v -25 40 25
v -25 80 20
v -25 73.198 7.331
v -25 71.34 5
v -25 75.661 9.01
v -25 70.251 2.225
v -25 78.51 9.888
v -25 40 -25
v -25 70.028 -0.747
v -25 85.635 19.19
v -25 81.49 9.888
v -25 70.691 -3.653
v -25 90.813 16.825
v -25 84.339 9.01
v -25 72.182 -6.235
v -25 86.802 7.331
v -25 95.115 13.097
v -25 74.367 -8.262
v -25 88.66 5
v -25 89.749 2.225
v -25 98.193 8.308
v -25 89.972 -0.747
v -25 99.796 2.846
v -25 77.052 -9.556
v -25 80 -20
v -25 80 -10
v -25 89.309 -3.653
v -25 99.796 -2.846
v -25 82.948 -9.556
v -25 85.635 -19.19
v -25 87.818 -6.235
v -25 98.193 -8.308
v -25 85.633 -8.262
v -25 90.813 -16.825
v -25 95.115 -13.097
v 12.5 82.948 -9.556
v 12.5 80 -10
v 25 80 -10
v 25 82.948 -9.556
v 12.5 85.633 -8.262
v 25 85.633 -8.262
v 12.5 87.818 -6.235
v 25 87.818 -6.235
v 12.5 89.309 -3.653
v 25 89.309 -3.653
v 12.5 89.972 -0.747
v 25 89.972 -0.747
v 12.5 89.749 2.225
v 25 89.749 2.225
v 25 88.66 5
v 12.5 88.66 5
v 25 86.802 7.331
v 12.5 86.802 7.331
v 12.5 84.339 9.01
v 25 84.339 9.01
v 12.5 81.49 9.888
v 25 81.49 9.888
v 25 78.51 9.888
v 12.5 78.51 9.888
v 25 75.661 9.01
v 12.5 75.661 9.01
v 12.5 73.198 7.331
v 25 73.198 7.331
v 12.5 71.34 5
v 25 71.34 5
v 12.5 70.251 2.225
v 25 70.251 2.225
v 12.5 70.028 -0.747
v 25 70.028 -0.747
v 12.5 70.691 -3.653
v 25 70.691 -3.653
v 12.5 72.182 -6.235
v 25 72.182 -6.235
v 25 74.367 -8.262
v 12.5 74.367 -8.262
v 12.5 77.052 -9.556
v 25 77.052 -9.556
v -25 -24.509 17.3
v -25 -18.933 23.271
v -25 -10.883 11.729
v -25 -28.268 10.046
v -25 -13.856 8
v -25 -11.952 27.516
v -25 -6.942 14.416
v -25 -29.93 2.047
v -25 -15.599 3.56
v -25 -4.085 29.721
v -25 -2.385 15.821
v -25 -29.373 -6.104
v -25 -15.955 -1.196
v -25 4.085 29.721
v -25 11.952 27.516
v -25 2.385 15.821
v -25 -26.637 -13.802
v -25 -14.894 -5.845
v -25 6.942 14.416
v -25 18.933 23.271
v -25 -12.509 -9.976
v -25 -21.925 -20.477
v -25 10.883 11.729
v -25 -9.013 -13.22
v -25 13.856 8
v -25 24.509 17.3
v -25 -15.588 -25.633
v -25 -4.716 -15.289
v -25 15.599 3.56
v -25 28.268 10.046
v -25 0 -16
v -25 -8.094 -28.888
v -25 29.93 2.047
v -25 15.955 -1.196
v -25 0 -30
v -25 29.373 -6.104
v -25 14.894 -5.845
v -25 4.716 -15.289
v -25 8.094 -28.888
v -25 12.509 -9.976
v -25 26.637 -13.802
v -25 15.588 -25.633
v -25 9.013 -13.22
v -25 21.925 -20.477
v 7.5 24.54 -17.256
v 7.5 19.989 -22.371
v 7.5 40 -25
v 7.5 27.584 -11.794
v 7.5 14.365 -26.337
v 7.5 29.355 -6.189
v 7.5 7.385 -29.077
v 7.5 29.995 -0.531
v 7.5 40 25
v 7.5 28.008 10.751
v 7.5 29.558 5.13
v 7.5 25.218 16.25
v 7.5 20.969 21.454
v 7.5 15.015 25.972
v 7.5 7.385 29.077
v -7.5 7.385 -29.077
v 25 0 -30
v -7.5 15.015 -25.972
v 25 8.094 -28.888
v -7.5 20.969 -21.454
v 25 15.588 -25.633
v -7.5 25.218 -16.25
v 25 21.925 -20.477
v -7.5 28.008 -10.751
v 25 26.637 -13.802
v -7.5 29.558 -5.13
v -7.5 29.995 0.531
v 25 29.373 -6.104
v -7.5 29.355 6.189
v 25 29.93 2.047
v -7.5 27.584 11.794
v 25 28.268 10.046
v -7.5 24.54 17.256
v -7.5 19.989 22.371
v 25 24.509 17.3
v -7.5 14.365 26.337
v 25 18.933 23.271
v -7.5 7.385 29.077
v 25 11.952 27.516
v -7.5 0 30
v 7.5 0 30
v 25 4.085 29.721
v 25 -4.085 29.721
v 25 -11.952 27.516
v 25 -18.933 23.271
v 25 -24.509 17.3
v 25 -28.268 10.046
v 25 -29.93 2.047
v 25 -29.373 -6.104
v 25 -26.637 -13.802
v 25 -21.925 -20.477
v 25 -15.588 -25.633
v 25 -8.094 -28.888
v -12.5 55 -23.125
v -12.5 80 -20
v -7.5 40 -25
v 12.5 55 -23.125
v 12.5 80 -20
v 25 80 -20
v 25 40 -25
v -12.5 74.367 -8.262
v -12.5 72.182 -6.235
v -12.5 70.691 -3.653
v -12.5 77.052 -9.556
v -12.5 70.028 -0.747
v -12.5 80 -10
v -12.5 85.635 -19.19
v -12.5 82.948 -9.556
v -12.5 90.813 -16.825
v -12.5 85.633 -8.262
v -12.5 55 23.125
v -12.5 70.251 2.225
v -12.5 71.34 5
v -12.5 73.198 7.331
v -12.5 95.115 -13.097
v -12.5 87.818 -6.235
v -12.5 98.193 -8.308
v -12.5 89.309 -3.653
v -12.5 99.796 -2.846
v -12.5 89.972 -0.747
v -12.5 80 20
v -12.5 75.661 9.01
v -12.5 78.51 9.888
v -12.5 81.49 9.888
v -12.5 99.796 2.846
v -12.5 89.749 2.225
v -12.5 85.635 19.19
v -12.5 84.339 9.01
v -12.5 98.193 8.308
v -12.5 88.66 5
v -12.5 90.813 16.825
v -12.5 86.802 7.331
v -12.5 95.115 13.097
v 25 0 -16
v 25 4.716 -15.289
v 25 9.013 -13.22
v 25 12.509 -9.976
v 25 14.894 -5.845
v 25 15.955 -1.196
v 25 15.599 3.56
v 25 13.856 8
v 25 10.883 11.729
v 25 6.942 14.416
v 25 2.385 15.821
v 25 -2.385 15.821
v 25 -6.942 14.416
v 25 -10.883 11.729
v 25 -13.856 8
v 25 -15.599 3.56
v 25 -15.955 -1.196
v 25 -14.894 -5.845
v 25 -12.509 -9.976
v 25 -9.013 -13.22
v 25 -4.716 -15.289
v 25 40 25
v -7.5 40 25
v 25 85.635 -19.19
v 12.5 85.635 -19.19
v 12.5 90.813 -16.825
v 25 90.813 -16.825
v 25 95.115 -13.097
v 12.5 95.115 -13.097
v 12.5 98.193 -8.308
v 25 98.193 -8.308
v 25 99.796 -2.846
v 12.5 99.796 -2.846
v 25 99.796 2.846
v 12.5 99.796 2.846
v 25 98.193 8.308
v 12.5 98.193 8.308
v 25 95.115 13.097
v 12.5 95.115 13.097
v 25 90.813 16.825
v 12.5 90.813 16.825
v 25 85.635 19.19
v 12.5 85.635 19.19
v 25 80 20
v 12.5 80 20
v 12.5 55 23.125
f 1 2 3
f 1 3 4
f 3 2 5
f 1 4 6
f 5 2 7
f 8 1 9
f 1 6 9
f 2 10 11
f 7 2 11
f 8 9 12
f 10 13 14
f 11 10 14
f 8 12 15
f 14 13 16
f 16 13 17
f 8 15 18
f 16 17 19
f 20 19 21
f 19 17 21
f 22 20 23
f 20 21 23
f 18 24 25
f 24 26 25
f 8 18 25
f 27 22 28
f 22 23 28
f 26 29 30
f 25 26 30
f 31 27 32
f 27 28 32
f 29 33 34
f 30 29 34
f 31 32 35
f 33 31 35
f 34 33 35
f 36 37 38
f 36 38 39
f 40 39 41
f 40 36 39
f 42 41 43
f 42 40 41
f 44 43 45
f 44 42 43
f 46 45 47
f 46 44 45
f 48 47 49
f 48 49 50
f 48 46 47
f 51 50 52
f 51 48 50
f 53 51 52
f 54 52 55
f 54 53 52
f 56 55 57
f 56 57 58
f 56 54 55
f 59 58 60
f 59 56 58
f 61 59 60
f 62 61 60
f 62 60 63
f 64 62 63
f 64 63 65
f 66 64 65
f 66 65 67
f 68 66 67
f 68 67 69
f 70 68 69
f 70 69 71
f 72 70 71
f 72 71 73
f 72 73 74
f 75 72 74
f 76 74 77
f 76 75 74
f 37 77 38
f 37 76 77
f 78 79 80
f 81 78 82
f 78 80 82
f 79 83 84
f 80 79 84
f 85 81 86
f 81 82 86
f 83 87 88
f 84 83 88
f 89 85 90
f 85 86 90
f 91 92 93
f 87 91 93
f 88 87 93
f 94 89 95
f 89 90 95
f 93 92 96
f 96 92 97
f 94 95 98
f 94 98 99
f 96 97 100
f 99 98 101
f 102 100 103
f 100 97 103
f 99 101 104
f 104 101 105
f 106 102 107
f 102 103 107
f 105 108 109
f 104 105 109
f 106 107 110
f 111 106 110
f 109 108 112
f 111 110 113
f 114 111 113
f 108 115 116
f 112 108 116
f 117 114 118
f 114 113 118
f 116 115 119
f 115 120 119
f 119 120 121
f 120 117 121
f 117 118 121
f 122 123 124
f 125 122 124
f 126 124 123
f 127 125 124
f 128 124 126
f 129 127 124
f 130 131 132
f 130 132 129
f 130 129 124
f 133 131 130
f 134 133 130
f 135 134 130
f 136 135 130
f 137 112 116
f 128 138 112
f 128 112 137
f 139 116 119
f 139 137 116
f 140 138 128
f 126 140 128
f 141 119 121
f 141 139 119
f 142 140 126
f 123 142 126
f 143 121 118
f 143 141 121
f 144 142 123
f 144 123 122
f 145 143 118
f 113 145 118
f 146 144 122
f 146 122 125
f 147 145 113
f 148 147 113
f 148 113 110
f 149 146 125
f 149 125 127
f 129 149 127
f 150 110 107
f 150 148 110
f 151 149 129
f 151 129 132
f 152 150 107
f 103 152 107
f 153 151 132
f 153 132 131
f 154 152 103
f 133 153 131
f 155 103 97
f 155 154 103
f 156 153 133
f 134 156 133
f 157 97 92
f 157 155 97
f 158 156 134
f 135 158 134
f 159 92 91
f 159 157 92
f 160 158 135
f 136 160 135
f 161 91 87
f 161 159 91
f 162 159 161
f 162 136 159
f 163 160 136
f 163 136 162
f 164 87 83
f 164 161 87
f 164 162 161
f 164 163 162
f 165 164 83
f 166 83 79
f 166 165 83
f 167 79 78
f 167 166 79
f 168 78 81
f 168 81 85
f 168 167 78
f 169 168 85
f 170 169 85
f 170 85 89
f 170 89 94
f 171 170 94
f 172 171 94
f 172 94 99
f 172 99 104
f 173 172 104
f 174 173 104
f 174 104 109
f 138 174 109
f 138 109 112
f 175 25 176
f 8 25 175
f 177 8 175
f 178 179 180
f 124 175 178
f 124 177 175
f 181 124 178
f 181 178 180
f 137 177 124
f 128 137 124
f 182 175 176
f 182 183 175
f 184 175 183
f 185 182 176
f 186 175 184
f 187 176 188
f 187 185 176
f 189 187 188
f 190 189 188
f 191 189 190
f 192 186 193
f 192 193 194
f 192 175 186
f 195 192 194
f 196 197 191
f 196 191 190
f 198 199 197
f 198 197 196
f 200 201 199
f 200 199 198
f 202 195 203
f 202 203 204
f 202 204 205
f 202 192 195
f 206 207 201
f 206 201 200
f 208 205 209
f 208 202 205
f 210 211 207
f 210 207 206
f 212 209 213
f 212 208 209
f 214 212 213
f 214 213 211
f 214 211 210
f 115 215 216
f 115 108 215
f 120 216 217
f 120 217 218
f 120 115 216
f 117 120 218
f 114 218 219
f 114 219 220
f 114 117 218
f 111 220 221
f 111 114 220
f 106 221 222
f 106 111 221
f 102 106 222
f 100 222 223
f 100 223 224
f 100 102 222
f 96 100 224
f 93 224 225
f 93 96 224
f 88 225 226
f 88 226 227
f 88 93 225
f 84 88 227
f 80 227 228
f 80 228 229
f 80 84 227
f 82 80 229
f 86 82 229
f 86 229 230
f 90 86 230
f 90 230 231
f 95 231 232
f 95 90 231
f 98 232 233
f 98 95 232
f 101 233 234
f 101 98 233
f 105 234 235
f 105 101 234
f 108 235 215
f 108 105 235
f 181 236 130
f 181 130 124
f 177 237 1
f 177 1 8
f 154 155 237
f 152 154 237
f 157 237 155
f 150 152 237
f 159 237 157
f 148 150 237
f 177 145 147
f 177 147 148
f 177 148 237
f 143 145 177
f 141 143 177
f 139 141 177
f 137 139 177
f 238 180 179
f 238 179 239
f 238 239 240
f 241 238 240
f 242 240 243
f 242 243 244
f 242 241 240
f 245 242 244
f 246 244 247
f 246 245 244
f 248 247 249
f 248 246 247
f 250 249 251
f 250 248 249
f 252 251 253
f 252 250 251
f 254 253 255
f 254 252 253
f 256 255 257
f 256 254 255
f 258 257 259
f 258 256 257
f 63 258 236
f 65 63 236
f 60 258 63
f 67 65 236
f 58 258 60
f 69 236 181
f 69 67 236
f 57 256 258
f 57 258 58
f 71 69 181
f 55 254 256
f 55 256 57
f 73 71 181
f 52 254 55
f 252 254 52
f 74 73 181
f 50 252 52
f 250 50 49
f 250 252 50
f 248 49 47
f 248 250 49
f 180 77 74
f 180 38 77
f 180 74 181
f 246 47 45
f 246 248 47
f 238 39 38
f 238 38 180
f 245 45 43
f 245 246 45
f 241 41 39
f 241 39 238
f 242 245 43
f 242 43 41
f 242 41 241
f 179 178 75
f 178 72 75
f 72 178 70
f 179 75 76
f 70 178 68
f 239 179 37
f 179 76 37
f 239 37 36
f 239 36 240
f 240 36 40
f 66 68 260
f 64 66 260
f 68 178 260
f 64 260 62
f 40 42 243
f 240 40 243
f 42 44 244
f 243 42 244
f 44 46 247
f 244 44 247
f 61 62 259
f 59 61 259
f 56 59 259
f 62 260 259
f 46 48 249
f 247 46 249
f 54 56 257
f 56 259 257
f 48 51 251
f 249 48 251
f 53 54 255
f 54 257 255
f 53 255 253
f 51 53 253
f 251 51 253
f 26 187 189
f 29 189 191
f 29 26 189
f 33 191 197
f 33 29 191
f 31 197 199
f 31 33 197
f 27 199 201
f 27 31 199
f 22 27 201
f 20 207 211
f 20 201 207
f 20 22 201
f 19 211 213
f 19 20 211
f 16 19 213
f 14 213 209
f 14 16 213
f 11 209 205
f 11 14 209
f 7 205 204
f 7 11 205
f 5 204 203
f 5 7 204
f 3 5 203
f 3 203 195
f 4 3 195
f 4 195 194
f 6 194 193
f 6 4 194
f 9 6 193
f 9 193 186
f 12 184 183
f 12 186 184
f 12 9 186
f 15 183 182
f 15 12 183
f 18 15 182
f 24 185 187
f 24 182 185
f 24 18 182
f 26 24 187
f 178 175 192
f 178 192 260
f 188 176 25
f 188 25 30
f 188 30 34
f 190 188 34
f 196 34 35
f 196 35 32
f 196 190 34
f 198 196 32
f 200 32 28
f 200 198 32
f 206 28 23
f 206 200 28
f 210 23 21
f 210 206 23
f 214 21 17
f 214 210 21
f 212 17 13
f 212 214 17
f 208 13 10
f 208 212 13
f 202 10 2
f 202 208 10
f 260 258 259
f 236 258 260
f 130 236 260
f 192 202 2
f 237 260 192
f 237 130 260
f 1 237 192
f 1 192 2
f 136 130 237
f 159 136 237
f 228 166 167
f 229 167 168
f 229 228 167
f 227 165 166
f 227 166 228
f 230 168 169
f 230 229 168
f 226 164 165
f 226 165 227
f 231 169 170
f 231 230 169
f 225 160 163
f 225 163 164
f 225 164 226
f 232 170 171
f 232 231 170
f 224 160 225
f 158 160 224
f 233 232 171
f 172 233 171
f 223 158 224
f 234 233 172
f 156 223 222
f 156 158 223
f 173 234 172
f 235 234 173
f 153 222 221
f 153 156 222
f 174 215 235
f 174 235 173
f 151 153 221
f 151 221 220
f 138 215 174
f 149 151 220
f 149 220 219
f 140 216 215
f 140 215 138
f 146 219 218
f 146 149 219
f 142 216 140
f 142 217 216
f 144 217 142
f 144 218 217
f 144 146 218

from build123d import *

# Parameters (mm, degrees)
SKETCH1_R           = 30
SKETCH1_R_2         = 16
BOSS_EXTRUDE1_DEPTH = 25
SKETCH4_R           = 10
BOSS_EXTRUDE3_DEPTH = 25
SKETCH7_W           = 15
SKETCH7_H           = 50
SKETCH8_W           = 15
SKETCH8_H           = 60
SKETCH9_R           = 16
CUT_EXTRUDE1_DEPTH  = 50
SKETCH11_W          = 25
SKETCH11_H          = 50
CUT_EXTRUDE3_DEPTH  = 54.5


with BuildPart() as part:
    # Sketch1 → Boss-Extrude1 (new body, symmetric)
    with BuildSketch(Plane(origin=(0, 0, 0), x_dir=(0, 0, -1), z_dir=(1, 0, 0))):
        Circle(SKETCH1_R)
        Circle(SKETCH1_R_2, mode=Mode.SUBTRACT)
    extrude(amount=BOSS_EXTRUDE1_DEPTH, both=True)



with BuildPart() as body_2:
    # Sketch4 → Boss-Extrude3 (new body, symmetric)
    with BuildSketch(Plane(origin=(0, 0, 0), x_dir=(0, 0, -1), z_dir=(1, 0, 0))):
        with BuildLine():
            Line((-20, 80), (-25, 40))
            Line((-25, 40), (25, 40))
            Line((25, 40), (20, 80))
            ThreePointArc((20, 80), (0, 100), (-20, 80))
        make_face()
        with Locations((0, 80)):
            Circle(SKETCH4_R, mode=Mode.SUBTRACT)
    extrude(amount=BOSS_EXTRUDE3_DEPTH, both=True)


with BuildPart() as part_1:
    add(part.part)

    add(body_2.part)  # Loft1 merges body 2
    # Sketch7 → Loft1 section 0
    with BuildSketch(Plane.XZ.offset(-40)):
        Rectangle(SKETCH7_W, SKETCH7_H)
    # Sketch8 → Loft1 section 1
    with BuildSketch(Plane(origin=(0, 0, 0), x_dir=(1, 0, 0), z_dir=(0, 1, 0))):
        Rectangle(SKETCH8_W, SKETCH8_H)
    loft()

    # Sketch9 → Cut-Extrude1 (cut)
    with BuildSketch(Plane(origin=(25, 0, 0), x_dir=(0, 0, -1), z_dir=(1, 0, 0))):
        Circle(SKETCH9_R)
    extrude(amount=-CUT_EXTRUDE1_DEPTH, mode=Mode.SUBTRACT)

    # Sketch11 → Cut-Extrude3 (cut, symmetric)
    with BuildSketch(Plane.XY):
        with Locations((0, 80)):
            Rectangle(SKETCH11_W, SKETCH11_H)
    extrude(amount=CUT_EXTRUDE3_DEPTH, both=True, mode=Mode.SUBTRACT)


solid = part_1.part
